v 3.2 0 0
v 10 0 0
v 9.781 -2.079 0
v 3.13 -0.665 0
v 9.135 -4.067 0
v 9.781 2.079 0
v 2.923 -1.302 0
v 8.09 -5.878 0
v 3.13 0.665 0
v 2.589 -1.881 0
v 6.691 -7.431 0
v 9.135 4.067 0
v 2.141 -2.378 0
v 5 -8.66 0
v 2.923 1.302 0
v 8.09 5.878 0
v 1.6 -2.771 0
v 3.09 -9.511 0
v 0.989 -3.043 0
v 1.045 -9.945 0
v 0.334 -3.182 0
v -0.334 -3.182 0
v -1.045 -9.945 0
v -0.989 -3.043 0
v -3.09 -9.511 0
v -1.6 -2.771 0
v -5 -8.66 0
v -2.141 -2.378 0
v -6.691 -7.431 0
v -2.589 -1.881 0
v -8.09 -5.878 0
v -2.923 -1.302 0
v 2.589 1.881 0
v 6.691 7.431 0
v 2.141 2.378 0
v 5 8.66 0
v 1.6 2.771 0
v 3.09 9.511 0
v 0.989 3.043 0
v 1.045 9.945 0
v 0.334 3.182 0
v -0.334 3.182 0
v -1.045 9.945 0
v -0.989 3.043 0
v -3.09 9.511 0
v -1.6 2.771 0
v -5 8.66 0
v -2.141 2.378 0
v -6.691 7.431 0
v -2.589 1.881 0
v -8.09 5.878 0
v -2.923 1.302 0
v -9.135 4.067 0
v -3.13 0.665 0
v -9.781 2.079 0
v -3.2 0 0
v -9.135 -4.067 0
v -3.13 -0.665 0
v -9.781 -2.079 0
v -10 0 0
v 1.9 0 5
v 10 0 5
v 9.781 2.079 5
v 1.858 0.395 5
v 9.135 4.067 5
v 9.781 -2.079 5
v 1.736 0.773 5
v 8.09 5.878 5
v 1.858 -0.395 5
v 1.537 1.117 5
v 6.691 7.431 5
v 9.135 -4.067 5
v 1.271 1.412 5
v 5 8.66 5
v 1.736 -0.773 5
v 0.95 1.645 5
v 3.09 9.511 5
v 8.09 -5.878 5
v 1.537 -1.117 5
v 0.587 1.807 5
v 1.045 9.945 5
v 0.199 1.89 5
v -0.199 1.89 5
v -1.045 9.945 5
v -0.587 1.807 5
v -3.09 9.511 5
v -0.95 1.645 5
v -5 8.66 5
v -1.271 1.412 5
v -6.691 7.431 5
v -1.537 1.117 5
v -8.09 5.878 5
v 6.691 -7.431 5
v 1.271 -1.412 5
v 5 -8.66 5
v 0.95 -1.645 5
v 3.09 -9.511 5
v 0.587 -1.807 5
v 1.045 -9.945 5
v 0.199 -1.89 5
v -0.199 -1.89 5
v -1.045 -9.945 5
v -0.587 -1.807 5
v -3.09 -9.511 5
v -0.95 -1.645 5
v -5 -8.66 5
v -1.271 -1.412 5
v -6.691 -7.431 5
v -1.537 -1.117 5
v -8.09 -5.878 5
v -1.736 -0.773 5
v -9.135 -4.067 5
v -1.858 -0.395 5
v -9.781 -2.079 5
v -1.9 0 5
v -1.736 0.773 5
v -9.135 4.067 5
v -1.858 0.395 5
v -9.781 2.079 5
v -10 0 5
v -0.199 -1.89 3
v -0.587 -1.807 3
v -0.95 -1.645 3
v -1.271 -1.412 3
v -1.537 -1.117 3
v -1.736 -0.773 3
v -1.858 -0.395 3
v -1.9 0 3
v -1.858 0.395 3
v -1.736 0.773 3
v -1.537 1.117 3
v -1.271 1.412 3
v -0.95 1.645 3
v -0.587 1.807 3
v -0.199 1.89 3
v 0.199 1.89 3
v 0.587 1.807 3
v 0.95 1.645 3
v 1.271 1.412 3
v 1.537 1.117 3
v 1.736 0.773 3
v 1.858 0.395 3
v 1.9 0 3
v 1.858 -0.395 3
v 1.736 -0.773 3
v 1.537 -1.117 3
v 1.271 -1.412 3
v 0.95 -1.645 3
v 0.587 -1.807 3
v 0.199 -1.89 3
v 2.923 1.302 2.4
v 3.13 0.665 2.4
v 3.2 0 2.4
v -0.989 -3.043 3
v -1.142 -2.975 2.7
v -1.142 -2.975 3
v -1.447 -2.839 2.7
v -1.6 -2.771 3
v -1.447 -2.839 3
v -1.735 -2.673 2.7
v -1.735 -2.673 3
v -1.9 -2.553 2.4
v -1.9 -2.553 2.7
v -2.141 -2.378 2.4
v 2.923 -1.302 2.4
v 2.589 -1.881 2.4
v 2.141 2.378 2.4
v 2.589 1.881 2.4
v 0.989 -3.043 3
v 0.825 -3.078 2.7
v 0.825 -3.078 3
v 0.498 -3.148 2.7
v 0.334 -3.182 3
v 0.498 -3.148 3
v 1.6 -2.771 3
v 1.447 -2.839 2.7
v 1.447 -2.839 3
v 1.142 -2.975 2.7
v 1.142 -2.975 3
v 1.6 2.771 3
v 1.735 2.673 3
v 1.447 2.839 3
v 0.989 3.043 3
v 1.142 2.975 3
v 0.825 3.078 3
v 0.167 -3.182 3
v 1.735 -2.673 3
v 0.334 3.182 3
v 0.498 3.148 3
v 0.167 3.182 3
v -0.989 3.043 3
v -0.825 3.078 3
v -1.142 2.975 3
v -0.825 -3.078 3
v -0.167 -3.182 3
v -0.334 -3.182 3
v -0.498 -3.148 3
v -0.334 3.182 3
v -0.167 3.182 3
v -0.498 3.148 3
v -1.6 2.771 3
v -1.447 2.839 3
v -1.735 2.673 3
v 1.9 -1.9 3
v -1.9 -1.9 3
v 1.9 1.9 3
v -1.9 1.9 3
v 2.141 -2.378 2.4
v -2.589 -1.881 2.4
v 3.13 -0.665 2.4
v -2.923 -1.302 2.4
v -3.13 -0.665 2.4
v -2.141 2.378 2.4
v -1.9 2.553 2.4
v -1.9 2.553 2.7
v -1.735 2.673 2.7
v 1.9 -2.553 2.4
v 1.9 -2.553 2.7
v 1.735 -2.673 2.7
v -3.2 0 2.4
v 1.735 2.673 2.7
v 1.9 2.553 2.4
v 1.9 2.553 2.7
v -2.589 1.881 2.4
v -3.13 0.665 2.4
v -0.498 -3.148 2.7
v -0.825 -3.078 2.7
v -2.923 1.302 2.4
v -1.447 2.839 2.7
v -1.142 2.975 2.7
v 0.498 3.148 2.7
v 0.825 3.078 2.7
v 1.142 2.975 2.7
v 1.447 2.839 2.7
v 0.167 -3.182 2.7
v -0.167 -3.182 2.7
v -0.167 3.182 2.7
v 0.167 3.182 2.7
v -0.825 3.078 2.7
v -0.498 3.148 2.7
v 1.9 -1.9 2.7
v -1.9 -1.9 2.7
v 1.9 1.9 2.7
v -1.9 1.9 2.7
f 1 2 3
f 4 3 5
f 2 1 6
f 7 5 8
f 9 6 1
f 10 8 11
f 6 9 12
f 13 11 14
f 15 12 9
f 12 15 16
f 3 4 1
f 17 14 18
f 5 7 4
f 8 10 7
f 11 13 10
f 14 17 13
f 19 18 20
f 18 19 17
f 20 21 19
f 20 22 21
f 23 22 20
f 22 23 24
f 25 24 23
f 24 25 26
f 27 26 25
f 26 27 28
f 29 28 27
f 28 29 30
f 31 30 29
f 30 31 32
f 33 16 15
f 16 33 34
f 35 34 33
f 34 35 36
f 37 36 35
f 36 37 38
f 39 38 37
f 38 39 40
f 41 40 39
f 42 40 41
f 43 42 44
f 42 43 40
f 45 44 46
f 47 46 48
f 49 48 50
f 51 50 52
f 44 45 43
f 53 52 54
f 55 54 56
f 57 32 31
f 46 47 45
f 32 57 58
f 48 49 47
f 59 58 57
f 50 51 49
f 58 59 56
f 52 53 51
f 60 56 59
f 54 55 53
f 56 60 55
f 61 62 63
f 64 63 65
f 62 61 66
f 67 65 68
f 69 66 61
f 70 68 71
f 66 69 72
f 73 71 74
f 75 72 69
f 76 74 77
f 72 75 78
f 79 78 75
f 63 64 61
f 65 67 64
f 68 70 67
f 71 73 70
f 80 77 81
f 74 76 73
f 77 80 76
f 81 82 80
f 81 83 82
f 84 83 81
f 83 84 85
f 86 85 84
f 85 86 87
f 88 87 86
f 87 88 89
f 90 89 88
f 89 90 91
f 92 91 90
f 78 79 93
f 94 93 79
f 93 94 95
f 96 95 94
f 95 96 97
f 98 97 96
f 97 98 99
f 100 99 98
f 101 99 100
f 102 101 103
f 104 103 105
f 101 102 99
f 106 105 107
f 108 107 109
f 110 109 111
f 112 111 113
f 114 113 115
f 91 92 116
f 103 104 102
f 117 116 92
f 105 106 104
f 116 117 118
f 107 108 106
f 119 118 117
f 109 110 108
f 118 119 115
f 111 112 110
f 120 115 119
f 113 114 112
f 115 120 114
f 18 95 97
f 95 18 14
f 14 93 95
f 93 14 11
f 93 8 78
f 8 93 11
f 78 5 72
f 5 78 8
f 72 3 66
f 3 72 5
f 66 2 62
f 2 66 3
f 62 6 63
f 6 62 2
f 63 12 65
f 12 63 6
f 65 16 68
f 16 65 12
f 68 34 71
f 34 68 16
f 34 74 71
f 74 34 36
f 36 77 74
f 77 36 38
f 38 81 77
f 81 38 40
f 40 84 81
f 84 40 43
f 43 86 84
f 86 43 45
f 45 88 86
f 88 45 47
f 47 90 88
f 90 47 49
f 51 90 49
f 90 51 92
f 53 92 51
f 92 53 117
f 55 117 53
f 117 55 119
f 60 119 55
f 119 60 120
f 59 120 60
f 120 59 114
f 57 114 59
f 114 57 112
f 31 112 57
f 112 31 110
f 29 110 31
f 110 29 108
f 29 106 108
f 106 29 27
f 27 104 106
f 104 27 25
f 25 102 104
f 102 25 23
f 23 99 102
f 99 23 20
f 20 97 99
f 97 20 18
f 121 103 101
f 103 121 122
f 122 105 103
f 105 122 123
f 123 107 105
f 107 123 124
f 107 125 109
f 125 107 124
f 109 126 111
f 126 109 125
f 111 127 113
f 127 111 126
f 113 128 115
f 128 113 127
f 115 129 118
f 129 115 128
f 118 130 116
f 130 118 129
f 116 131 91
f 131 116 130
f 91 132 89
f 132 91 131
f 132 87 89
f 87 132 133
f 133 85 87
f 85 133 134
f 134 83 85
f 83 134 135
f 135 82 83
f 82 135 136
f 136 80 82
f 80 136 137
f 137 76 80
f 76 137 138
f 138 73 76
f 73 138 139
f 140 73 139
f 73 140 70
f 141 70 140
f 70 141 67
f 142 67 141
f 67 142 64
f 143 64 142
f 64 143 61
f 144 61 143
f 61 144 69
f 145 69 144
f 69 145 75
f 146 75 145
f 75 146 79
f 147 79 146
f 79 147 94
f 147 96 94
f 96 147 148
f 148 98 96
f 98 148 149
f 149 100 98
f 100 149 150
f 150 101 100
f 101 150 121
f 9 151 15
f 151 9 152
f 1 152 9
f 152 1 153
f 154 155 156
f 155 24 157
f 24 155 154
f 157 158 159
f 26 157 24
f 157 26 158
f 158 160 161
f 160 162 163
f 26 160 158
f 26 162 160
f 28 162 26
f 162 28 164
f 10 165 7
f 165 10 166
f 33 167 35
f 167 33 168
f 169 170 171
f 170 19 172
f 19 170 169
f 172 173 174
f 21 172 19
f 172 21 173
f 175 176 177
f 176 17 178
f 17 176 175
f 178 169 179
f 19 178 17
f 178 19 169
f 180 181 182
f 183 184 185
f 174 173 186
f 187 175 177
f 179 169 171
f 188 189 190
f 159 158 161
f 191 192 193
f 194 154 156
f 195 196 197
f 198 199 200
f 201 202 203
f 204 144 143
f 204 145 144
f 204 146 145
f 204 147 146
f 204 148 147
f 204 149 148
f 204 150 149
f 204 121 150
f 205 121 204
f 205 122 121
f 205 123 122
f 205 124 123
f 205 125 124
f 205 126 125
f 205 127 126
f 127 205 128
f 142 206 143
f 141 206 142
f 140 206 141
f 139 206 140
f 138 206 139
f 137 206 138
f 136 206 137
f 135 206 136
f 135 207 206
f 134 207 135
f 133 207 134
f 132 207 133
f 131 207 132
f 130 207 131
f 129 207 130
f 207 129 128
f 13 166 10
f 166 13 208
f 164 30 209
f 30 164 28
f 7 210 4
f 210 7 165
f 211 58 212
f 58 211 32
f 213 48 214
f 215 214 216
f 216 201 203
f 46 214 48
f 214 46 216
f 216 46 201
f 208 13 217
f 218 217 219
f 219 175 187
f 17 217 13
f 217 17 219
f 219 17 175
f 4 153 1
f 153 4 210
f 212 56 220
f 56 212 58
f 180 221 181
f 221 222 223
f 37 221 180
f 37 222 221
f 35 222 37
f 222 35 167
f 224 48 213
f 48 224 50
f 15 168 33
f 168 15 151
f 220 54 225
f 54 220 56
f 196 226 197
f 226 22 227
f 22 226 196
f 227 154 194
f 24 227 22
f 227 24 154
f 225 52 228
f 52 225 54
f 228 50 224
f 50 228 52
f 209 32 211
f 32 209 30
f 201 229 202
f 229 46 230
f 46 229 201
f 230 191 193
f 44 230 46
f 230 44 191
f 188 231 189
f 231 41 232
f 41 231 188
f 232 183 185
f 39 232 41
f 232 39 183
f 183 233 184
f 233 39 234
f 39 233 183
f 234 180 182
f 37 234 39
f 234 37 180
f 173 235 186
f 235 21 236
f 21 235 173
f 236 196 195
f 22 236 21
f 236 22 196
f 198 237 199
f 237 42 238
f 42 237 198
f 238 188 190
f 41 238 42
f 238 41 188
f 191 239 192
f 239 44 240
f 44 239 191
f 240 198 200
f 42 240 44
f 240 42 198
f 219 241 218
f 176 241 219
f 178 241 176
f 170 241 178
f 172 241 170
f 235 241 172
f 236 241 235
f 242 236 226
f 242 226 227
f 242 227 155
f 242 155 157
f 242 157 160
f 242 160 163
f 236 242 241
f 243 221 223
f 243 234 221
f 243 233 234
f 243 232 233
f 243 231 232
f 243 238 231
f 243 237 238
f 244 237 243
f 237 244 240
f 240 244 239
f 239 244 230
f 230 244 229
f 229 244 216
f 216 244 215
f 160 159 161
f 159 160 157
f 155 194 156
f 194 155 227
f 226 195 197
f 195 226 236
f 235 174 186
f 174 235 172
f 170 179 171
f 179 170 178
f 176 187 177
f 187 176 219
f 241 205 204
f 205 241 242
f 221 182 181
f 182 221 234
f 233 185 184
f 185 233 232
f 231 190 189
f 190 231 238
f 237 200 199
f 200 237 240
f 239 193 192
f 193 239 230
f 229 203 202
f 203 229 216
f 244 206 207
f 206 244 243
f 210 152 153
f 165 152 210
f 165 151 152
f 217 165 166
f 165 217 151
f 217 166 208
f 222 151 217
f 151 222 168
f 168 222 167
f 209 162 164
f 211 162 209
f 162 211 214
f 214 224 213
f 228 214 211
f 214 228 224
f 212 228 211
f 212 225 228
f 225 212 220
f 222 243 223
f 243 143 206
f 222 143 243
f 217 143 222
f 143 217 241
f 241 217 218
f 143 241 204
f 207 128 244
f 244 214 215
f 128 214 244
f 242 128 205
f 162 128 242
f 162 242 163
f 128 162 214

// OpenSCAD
// Experimenting with "sequential bridging", which is Makers Muse's term
// for the Prusa trick for making unsupported holes.

// Cross section:
//
//  *******   *******
//  *******   *******
//  *******   *******
//  *******   *******  <--- unsupported ledge
//  ****         ****
//  ****         ****
//
// When printing, where the hole transitions from a wider to a narrower
// diameter, the ledge is unsupported.  With small holes, this may be
// good enough, but with larger ones, the ledge will droop and the
// wider recess won't be very clean.
//
// The sequential bridging trick is to create two pairs of bridges on
// two consecutive layers that can then support the actual ledge.

nozzle_d = 0.4;
layer_h = 0.3;
$fs = nozzle_d/2;

bore_d = 3.4;
recess_d = 6;
recess_h = 2.4;

module sequential_bridges(layers=2, layer_h=0.3) {
    module bridge(h) {
        translate([0, 0, -h]) {
            linear_extrude(h+0.0001) {
                difference() {
                    circle(d=recess_d+nozzle_d+0.0001);
                    square([bore_d+nozzle_d, recess_d+nozzle_d+0.0001],
                           center=true);
                }
            }
        }
    }

    for (layer = [1:layers]) {
        theta = layer * 180/layers;
        rotate([0, 0, theta]) bridge(layer*layer_h);
    }
}

module floating_hole(bridging_layers=2) {
    ledge_h = bridging_layers * layer_h;
    
    difference() {
        linear_extrude(5, convexity=8) {
            difference() {
                circle(d=20);
                circle(d=bore_d+nozzle_d);
            }
        }

        translate([0, 0, -1]) {
            linear_extrude(1 + recess_h + ledge_h, convexity=8) {
                circle(d=recess_d+nozzle_d);
            }
        }
    }
    
    translate([0, 0, recess_h + ledge_h])
        sequential_bridges(bridging_layers, layer_h);
}

floating_hole(bridging_layers=2);
